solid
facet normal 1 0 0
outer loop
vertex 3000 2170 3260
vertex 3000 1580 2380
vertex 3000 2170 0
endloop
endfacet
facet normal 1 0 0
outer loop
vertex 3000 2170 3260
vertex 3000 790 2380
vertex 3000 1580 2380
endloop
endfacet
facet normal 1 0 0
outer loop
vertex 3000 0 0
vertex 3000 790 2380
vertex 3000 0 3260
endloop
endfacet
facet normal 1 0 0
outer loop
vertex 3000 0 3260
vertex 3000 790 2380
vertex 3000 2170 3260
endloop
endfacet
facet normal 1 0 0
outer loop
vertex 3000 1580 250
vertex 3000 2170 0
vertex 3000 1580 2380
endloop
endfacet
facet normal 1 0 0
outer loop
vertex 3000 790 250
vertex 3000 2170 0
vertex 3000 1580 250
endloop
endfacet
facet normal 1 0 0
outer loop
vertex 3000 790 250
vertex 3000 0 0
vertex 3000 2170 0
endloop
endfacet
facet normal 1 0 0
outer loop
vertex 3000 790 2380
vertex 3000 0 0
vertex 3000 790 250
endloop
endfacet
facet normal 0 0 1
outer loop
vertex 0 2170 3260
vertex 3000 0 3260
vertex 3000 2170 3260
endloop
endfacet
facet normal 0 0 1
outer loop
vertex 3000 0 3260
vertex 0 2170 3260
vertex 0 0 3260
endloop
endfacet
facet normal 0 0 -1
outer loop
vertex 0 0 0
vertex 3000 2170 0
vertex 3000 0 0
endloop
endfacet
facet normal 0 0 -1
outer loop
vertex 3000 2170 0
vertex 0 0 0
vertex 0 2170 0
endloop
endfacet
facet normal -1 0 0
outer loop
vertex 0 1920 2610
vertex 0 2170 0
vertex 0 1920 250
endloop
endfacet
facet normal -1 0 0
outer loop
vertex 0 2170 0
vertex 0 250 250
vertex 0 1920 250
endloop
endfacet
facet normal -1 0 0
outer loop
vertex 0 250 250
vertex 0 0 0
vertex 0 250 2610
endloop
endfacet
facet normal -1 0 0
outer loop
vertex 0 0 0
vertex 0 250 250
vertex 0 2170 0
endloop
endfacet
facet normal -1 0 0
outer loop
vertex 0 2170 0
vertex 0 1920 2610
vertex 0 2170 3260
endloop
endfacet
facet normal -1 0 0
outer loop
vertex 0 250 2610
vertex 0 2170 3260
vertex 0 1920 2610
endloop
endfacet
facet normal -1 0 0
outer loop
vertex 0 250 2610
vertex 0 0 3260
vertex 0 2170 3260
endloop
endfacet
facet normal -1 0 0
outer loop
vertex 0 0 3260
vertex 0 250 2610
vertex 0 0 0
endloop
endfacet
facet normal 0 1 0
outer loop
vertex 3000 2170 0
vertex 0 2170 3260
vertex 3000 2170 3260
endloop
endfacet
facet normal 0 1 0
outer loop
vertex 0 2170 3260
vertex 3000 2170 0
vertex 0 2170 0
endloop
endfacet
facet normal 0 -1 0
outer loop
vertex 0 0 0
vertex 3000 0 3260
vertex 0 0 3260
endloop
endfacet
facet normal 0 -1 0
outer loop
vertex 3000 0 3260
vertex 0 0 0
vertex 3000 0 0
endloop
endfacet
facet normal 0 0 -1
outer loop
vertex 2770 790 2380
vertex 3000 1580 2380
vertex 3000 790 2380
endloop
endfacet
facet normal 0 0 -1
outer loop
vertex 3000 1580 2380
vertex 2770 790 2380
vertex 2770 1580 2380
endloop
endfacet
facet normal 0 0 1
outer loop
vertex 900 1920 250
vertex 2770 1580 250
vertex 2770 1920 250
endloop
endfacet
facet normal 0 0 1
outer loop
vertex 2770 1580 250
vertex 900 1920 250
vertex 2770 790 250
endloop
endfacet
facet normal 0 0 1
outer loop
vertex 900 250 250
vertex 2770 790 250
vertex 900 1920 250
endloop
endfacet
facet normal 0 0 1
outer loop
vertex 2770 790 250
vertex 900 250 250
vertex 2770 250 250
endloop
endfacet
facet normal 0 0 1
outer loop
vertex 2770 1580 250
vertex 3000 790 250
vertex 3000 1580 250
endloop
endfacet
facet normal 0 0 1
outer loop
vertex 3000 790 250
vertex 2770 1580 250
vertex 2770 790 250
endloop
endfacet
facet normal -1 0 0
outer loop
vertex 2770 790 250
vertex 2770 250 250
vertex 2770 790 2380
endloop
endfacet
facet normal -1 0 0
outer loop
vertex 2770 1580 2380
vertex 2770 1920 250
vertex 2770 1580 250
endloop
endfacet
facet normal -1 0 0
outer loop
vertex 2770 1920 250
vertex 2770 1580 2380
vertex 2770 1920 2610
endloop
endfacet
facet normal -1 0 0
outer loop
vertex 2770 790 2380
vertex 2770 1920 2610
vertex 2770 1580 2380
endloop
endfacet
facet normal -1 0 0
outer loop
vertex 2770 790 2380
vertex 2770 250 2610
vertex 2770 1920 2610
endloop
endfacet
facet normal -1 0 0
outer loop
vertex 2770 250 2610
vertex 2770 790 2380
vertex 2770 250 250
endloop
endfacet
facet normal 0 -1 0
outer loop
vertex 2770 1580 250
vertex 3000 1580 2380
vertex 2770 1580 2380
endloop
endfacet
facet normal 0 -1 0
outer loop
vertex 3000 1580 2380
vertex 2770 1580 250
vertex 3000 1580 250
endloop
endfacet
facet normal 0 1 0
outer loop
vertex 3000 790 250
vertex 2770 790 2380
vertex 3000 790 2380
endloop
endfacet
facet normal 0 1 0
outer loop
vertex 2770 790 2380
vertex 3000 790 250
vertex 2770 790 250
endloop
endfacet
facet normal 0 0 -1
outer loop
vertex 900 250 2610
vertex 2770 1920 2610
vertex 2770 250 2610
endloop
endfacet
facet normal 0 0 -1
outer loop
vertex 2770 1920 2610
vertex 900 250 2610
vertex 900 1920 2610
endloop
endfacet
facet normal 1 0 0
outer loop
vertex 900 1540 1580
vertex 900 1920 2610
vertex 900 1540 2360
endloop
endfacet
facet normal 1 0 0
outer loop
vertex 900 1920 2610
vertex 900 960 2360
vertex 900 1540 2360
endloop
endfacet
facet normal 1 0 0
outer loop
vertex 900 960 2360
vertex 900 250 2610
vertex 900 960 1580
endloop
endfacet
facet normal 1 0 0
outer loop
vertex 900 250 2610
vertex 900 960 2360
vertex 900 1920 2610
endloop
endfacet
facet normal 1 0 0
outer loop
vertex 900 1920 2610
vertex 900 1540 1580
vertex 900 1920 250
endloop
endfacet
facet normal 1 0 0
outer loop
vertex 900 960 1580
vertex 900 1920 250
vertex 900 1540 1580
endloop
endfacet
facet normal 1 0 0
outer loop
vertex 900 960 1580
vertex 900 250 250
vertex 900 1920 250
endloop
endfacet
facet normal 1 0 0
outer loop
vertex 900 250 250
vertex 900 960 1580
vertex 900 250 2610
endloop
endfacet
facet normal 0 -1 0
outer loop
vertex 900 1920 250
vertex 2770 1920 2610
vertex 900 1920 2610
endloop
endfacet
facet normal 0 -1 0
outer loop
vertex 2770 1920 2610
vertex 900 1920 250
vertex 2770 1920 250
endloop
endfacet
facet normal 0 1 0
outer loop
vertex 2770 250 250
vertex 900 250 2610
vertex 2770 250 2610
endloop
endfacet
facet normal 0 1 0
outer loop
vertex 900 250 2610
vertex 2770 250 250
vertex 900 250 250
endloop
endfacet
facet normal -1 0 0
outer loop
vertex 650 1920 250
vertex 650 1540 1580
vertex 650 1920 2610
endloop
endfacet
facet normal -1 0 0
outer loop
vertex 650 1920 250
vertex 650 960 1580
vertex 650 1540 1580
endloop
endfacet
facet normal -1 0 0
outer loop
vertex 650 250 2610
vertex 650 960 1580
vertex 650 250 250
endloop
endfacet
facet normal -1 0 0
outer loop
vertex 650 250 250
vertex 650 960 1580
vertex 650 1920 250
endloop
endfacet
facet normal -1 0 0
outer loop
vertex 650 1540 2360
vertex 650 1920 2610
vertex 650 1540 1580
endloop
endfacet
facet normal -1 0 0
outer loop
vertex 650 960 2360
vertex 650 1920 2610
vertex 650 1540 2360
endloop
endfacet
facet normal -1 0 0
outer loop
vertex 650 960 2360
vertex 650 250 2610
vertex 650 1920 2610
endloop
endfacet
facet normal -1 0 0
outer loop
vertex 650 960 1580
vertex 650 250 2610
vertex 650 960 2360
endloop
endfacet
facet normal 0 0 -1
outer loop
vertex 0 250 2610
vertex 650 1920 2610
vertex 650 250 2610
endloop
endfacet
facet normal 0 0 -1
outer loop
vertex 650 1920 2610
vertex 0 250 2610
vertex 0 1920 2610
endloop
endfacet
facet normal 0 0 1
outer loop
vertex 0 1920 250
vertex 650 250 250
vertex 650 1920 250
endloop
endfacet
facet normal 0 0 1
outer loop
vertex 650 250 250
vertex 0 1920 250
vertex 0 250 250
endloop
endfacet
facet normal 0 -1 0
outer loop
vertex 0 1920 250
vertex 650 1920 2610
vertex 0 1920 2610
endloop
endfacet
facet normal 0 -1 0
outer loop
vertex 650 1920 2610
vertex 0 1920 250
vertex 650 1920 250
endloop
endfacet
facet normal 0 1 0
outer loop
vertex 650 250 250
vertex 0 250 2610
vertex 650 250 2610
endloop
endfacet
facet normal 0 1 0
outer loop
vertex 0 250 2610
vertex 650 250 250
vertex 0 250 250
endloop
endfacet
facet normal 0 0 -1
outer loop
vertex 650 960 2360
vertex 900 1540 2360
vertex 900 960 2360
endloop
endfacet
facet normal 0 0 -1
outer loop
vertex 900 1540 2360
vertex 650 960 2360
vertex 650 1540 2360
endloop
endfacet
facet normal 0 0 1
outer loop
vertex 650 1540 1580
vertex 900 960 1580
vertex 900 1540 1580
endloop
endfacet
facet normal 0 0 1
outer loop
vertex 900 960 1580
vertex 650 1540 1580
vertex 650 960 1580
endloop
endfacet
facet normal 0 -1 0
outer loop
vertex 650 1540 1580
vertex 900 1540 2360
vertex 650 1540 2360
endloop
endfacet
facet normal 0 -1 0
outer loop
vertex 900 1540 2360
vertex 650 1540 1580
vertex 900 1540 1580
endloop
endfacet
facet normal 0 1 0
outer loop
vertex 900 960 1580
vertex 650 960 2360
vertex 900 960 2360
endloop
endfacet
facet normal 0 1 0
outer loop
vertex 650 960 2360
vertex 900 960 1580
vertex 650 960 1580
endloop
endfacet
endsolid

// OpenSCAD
module subtoilet(){
difference(){
//总框架
cube([3000,250+1670+250,2760+250+250]);
//连接门廊的门
translate([650+250+1870,790,250])
cube([230,790,2130]);
//屋内空间
translate([650+250,250,250])
cube([1870,1670,2360]);
//房屋外空调机空间
translate([0,250,250])
cube([650,1670,2360]);
//窗户
translate([650,1670-130-580,1580])
cube([250,580,780]);
}

}
subtoilet();
